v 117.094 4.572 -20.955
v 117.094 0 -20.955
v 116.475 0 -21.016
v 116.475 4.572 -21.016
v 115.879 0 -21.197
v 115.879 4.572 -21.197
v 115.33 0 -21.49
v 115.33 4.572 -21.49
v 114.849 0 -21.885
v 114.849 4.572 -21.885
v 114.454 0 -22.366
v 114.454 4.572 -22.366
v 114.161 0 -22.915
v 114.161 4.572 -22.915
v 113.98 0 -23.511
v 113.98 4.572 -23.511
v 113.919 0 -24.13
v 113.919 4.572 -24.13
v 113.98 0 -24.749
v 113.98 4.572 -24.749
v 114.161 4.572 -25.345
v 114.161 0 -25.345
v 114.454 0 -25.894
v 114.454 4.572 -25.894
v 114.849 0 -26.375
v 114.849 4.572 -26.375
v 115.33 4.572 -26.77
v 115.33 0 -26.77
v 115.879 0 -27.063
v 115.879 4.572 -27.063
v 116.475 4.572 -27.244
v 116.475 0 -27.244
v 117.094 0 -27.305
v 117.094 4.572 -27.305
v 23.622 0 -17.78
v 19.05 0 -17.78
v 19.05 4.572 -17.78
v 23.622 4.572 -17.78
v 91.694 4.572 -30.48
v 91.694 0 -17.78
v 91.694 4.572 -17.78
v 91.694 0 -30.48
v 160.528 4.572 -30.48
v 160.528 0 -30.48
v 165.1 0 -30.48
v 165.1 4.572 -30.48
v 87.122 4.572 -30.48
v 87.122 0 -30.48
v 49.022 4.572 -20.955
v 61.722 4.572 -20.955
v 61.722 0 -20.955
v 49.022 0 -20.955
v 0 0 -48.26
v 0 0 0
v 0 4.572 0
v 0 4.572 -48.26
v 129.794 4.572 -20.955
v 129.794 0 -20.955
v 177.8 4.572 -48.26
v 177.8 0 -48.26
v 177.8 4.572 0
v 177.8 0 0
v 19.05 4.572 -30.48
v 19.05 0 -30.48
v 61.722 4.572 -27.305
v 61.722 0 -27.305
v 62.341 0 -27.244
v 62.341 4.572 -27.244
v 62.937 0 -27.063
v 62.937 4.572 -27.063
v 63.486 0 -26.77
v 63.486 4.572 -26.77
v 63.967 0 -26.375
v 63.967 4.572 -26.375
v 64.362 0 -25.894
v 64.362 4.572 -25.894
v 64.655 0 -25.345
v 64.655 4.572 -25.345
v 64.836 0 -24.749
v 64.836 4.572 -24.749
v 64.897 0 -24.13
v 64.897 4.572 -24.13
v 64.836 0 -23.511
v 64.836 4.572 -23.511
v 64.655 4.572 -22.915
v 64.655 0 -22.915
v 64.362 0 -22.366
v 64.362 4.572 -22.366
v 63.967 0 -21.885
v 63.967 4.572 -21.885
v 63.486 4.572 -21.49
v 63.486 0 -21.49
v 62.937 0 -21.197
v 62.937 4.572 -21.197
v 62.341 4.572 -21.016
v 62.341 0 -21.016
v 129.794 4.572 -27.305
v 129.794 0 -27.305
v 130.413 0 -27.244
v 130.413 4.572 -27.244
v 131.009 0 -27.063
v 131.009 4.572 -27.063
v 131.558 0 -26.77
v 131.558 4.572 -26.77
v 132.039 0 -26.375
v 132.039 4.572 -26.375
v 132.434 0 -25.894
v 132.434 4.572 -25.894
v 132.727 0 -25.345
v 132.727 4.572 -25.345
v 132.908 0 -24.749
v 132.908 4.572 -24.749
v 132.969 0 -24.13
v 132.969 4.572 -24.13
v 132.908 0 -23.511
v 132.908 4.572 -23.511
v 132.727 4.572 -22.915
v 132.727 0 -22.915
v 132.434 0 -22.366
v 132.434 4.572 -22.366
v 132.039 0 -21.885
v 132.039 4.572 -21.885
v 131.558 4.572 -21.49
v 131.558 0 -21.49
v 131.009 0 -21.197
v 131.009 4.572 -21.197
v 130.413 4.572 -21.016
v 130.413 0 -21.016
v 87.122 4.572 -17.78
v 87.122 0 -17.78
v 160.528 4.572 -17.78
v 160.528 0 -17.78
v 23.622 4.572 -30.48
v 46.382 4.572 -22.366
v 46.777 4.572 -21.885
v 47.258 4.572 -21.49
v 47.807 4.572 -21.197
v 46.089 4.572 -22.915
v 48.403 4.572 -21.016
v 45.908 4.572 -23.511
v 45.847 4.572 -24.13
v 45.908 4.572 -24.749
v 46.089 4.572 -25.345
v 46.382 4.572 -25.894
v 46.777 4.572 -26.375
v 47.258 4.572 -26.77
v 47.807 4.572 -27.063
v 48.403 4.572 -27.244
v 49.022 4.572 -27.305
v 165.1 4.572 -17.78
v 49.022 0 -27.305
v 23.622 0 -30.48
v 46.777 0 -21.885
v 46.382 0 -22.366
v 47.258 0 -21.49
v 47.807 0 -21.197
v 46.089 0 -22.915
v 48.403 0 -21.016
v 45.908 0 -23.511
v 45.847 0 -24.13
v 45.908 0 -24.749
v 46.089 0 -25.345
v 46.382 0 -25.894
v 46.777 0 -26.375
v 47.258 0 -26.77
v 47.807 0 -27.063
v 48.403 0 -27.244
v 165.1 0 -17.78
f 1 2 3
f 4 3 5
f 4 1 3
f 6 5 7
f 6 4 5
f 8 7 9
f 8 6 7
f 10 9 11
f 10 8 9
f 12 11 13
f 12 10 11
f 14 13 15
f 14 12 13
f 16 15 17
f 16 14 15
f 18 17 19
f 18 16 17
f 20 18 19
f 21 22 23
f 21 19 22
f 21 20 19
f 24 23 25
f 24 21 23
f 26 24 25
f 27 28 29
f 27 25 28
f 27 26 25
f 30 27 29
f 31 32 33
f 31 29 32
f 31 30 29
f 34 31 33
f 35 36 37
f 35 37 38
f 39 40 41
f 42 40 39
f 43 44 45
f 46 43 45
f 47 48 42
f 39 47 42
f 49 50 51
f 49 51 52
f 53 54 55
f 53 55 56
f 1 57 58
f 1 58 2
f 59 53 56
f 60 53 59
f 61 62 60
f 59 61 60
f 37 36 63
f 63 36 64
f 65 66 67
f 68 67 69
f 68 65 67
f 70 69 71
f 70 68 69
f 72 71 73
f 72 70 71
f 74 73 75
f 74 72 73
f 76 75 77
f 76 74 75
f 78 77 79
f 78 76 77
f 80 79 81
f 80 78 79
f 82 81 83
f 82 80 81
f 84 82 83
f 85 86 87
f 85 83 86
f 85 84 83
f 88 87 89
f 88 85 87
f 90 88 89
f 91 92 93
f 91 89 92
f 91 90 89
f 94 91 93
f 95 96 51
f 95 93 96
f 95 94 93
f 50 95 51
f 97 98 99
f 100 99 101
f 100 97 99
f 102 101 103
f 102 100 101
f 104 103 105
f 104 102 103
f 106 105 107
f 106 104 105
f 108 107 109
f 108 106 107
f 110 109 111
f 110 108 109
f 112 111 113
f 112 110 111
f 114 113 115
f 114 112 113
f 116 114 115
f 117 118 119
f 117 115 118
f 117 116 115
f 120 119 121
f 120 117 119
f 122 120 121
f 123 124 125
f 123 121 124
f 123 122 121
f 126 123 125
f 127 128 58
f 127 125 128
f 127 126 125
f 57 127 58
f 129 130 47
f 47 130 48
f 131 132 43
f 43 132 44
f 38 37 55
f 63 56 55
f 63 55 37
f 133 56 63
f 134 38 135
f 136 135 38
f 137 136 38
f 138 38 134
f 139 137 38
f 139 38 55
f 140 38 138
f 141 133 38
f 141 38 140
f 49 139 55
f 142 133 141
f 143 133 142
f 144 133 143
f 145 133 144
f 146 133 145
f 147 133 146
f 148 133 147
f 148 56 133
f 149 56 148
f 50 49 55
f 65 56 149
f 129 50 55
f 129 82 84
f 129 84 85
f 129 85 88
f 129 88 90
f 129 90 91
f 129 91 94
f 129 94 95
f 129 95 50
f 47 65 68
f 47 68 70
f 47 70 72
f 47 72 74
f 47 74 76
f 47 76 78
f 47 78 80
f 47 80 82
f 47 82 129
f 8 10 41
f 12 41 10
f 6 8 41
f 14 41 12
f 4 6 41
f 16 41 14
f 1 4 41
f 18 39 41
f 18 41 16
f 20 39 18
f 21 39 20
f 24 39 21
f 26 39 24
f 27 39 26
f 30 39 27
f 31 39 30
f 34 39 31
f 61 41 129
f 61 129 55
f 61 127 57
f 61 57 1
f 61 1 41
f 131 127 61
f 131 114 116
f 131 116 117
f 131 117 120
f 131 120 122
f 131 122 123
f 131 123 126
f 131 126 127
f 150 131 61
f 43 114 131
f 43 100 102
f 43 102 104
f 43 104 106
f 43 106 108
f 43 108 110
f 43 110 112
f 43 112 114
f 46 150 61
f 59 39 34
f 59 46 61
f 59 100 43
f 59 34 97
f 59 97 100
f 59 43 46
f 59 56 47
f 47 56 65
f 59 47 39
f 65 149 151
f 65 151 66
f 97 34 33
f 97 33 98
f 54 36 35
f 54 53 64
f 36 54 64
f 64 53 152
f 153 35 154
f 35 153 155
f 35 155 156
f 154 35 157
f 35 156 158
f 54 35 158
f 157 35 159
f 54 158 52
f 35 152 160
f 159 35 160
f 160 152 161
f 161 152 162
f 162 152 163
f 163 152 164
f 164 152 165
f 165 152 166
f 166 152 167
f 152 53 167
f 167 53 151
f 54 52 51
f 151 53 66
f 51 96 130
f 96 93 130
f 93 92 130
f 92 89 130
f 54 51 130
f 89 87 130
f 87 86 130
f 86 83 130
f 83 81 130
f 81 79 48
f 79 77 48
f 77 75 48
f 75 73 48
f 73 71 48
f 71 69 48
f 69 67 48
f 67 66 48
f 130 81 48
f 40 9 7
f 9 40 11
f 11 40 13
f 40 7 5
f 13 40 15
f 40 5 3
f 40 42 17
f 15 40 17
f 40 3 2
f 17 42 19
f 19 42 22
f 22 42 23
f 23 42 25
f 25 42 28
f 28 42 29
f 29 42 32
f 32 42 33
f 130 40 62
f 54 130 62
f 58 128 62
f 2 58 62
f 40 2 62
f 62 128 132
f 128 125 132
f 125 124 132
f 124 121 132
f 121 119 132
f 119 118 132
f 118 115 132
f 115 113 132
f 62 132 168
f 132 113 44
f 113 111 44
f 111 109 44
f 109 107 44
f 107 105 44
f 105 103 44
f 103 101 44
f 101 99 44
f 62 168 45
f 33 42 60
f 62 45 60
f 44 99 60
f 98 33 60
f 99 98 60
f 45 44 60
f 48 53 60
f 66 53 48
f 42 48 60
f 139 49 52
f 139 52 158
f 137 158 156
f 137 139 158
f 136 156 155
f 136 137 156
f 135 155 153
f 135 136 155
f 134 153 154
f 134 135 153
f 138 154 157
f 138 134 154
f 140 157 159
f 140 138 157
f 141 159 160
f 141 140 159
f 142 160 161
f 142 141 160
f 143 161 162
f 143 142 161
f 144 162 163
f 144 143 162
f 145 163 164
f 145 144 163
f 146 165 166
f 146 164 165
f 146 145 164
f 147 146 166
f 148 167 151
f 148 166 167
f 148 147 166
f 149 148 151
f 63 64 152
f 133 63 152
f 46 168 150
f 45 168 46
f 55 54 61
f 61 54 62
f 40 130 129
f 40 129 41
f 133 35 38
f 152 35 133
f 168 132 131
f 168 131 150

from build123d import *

# Parameters (mm, degrees)
SKETCH1_W           = 177.8
SKETCH1_H           = 48.26
SKETCH1_W_2         = 4.572
SKETCH1_H_2         = 12.7
BOSS_EXTRUDE1_DEPTH = 4.572
CUT_EXTRUDE1_DEPTH  = 5.08


with BuildPart() as part:
    # Sketch1 → Boss-Extrude1 (new body)
    with BuildSketch(Plane(origin=(0, 0, 0), x_dir=(1, 0, 0), z_dir=(0, 1, 0))):
        with Locations((88.9, 24.13)):
            Rectangle(SKETCH1_W, SKETCH1_H)
        with Locations((162.814, 24.13)):
            Rectangle(SKETCH1_W_2, SKETCH1_H_2, mode=Mode.SUBTRACT)
        with Locations((89.408, 24.13)):
            Rectangle(SKETCH1_W_2, SKETCH1_H_2, mode=Mode.SUBTRACT)
        with Locations((21.336, 24.13)):
            Rectangle(SKETCH1_W_2, SKETCH1_H_2, mode=Mode.SUBTRACT)
    extrude(amount=BOSS_EXTRUDE1_DEPTH)

    # Sketch2 → Cut-Extrude1 (cut)
    with BuildSketch(Plane(origin=(0, 4.572, 0), x_dir=(1, 0, 0), z_dir=(0, 1, 0))):
        with BuildLine():
            Line((49.022, 27.305), (61.722, 27.305))
            ThreePointArc((61.722, 27.305), (64.897, 24.13), (61.722, 20.955))
            Line((61.722, 20.955), (49.022, 20.955))
            ThreePointArc((49.022, 20.955), (45.847, 24.13), (49.022, 27.305))
        make_face()
        with BuildLine():
            Line((117.094, 27.305), (129.794, 27.305))
            ThreePointArc((129.794, 27.305), (132.969, 24.13), (129.794, 20.955))
            Line((129.794, 20.955), (117.094, 20.955))
            ThreePointArc((117.094, 20.955), (113.919, 24.13), (117.094, 27.305))
        make_face()
    extrude(amount=-CUT_EXTRUDE1_DEPTH, mode=Mode.SUBTRACT)


solid = part.part
